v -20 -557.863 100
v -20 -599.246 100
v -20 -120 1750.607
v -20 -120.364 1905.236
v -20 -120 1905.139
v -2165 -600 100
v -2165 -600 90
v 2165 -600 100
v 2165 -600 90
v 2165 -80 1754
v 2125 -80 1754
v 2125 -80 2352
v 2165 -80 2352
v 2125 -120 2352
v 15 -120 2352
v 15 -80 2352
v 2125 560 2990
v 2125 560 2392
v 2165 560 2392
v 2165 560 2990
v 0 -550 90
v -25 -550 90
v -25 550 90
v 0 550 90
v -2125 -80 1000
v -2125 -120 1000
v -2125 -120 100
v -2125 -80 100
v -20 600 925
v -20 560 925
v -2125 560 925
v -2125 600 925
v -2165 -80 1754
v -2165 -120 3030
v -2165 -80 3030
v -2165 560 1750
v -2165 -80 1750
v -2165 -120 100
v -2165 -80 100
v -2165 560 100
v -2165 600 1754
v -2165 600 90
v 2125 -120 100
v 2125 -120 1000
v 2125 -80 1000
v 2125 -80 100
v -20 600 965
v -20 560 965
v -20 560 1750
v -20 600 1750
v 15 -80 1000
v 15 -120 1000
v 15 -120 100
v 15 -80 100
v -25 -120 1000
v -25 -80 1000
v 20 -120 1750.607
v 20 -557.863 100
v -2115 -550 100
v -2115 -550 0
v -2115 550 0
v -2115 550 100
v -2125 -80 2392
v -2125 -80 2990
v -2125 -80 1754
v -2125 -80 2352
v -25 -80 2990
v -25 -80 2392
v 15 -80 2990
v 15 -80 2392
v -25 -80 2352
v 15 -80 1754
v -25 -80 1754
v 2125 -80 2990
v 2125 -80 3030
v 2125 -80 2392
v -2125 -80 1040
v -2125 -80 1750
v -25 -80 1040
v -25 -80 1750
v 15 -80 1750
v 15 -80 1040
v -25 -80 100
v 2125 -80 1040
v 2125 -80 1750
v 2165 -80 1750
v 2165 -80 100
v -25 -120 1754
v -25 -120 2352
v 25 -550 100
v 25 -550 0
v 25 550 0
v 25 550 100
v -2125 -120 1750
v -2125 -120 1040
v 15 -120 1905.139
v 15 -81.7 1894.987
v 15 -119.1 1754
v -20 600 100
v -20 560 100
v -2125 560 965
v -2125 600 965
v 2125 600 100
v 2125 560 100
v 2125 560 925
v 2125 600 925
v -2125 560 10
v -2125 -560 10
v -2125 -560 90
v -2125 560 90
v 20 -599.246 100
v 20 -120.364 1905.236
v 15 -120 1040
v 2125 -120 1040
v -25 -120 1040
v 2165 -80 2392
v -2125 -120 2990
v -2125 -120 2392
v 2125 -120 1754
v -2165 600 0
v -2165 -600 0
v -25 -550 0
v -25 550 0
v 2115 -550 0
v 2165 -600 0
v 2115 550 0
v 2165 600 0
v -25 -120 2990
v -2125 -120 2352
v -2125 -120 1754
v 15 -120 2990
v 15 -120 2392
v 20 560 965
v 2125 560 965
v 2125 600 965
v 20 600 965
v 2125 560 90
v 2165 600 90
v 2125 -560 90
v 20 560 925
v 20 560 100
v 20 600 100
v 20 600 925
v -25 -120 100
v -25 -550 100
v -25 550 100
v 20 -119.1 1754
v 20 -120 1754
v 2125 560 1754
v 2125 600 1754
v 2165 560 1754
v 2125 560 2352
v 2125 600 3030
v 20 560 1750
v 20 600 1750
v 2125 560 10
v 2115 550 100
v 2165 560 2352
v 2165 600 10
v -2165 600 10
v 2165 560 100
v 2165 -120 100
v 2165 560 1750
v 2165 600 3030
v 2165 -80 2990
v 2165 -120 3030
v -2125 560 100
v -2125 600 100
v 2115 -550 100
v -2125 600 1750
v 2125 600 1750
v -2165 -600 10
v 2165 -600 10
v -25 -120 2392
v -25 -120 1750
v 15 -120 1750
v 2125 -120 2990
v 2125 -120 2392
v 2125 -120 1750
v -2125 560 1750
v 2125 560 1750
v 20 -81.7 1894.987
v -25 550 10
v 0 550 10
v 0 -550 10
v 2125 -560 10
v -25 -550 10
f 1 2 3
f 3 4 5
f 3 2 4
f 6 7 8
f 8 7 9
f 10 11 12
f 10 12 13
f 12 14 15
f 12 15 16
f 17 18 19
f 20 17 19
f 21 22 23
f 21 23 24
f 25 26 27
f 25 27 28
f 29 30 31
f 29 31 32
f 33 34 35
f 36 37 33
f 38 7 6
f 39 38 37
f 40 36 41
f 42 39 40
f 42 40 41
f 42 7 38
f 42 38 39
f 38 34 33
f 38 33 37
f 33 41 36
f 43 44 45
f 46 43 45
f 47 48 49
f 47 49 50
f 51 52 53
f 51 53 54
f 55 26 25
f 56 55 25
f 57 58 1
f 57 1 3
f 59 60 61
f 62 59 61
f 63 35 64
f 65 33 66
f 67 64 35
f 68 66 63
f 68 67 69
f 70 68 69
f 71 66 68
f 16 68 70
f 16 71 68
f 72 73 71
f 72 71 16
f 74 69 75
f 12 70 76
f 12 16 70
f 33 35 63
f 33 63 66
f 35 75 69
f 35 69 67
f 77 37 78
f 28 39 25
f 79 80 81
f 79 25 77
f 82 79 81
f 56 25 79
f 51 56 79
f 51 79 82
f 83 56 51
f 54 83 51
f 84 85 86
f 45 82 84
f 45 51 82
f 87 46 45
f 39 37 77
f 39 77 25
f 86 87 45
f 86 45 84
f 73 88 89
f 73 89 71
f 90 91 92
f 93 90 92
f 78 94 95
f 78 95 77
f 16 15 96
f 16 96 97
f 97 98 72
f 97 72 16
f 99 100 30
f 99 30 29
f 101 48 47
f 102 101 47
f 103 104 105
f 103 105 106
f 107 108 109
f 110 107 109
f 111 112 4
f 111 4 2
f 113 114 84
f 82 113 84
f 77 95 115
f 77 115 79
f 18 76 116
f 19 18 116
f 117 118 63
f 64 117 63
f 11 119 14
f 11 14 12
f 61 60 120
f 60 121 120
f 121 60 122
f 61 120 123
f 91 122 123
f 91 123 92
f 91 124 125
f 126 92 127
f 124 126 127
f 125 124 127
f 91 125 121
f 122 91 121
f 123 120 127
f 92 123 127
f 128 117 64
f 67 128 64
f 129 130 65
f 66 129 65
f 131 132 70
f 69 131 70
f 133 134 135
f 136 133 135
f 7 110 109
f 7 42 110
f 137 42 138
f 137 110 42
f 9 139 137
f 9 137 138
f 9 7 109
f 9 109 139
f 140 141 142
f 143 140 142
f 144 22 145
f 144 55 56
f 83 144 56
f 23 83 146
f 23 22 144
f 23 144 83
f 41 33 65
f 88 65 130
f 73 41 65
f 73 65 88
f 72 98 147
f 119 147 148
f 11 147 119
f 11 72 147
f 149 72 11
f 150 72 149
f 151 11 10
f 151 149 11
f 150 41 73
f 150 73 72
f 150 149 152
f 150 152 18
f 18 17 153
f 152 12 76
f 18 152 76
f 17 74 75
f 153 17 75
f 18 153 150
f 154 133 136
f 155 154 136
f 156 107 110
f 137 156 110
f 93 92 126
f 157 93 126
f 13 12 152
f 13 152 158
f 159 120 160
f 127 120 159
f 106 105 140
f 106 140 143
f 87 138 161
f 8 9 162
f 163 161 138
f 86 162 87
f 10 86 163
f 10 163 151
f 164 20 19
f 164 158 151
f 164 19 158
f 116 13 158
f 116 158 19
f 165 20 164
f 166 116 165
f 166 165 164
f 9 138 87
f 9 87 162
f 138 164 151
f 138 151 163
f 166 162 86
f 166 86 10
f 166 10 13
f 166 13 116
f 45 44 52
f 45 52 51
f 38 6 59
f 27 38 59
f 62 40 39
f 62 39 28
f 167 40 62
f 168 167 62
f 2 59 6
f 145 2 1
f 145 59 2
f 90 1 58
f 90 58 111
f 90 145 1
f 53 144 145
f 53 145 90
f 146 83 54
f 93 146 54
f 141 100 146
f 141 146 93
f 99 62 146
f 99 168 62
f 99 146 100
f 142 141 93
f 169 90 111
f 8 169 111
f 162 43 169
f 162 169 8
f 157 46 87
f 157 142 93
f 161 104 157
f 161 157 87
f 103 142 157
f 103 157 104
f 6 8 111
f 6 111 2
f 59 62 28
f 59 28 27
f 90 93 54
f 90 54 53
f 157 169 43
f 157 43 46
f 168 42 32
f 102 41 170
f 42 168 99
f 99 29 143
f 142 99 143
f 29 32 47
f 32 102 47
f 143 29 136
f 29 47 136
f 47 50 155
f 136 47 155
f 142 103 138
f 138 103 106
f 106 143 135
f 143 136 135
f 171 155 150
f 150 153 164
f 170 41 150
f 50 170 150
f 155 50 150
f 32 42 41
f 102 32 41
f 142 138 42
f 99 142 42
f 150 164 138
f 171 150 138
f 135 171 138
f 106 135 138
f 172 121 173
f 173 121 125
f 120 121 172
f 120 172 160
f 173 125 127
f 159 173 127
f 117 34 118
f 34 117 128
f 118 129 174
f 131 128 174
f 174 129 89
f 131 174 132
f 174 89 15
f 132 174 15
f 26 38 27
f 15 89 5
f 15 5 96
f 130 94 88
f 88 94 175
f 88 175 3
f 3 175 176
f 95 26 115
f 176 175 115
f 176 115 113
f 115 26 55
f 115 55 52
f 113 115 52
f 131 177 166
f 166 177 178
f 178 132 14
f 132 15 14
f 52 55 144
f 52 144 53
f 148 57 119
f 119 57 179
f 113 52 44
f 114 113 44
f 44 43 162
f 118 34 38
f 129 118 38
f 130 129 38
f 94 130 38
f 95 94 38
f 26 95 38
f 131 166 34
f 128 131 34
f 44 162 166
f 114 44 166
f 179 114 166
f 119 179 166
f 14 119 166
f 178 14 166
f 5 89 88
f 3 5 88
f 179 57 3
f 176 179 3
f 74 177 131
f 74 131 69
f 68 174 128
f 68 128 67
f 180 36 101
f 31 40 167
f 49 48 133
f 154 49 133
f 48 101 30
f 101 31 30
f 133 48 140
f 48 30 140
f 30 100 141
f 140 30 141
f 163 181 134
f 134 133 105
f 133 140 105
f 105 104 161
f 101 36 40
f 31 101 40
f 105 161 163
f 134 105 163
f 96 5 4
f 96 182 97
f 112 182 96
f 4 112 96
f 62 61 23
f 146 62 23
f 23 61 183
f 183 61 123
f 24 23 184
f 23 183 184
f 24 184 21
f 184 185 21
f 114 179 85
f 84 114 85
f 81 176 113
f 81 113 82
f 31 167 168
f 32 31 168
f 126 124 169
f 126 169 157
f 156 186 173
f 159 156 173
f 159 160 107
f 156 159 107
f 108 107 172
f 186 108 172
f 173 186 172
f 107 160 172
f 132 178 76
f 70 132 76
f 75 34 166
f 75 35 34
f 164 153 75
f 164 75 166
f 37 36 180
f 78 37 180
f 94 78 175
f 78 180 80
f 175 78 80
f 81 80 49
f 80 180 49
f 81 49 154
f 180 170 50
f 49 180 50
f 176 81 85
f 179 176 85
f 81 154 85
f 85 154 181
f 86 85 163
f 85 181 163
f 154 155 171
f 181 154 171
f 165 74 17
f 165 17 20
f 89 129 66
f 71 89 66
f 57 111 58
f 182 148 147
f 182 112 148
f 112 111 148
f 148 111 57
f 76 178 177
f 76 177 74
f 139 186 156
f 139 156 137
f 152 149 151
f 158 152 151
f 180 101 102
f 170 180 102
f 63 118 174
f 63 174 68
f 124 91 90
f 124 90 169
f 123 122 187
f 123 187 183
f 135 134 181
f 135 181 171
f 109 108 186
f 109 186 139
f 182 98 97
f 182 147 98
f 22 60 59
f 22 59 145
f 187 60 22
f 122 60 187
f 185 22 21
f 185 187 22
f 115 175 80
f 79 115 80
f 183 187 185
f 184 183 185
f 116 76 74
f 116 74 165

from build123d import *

# Parameters (mm, degrees)
F0_W          = 4330
F0_H          = 1200
F0_W_2        = 2090
F0_H_2        = 1100
F1_DEPTH      = 100
F2_W          = 40
F2_H          = 80
F3_DEPTH      = 4330.001
F4_W          = 40
F4_H          = 80
F5_DEPTH      = 1160.001
F7_W          = 90
F7_H          = 80
F8_DEPTH      = 550
F8_DEPTH_BACK = 550
F9_W          = 40
F9_H          = 40
F10_DEPTH     = 2930
F11_W         = 4330
F11_H         = 720
F12_DEPTH     = 4
F13_DEPTH     = 1650
F14_W         = 40
F14_H         = 40
F15_DEPTH     = 4300
F16_W         = 40
F16_H         = 40
F17_DEPTH     = 720
F19_DEPTH     = 20


with BuildPart() as f1:
    # F0 (on Top) → F1 (new body)
    with BuildSketch(Plane.XY):
        Rectangle(F0_W, F0_H)
        with Locations((-1070, 0)):
            Rectangle(F0_W_2, F0_H_2, mode=Mode.SUBTRACT)
        with Locations((1070, 0)):
            Rectangle(F0_W_2, F0_H_2, mode=Mode.SUBTRACT)
    extrude(amount=F1_DEPTH)

    # F2 (on face) → F3 (cut, through all)
    with BuildSketch(Plane(origin=(-2165, 0, 0), x_dir=(0, -1, 0), z_dir=(-1, 0, 0))):
        with Locations((-580, 50)):
            Rectangle(F2_W, F2_H)
        with Locations((580, 50)):
            Rectangle(F2_W, F2_H)
    extrude(amount=-F3_DEPTH, mode=Mode.SUBTRACT)

    # F4 (on face) → F5 (cut, through all)
    with BuildSketch(Plane.XZ.offset(560)):
        with Locations((2145, 50)):
            Rectangle(F4_W, F4_H)
        with Locations((-2145, 50)):
            Rectangle(F4_W, F4_H)
    extrude(amount=-F5_DEPTH, mode=Mode.SUBTRACT)

    # F7 (on Front) → F8 (cut, two sides)
    with BuildSketch(Plane.XZ) as f8_sk:
        with Locations((-45, 50)):
            Rectangle(F7_W, F7_H)
    extrude(amount=-F8_DEPTH, mode=Mode.SUBTRACT)
    extrude(f8_sk.sketch, amount=F8_DEPTH_BACK, mode=Mode.SUBTRACT)

    # F9 (on face) → F10 (join)
    with BuildSketch(Plane.XY.offset(100)):
        with Locations((-2145, -100)):
            Rectangle(F9_W, F9_H)
        with Locations((-5, -100)):
            Rectangle(F9_W, F9_H)
        with Locations((2145, 580)):
            Rectangle(F9_W, F9_H)
        with Locations((2145, -100)):
            Rectangle(F9_W, F9_H)
    extrude(amount=F10_DEPTH)

    # F11 (on offset) → F12 (join)
    with BuildSketch(Plane.XY.offset(1750)):
        with Locations((0, 240)):
            Rectangle(F11_W, F11_H)
    extrude(amount=F12_DEPTH)

    # F9 (on face) → F13 (join)
    with BuildSketch(Plane.XY.offset(100)):
        with Locations((-2145, 580)):
            Rectangle(F9_W, F9_H)
        with Locations((2145, 580)):
            Rectangle(F9_W, F9_H)
        with Locations((0, 580)):
            Rectangle(F9_W, F9_H)
        with Locations((-2145, -100)):
            Rectangle(F9_W, F9_H)
        with Locations((-5, -100)):
            Rectangle(F9_W, F9_H)
        with Locations((2145, -100)):
            Rectangle(F9_W, F9_H)
    extrude(amount=F13_DEPTH)

    # F14 (on face) → F15 (join)
    with BuildSketch(Plane.YZ.offset(2165)):
        with Locations((-100, 3010)):
            Rectangle(F14_W, F14_H)
        with Locations((580, 945)):
            Rectangle(F14_W, F14_H)
        with Locations((-100, 1020)):
            Rectangle(F14_W, F14_H)
        with Locations((-100, 2372)):
            Rectangle(F14_W, F14_H)
    extrude(amount=-F15_DEPTH)

    # F16 (on face) → F17 (join)
    with BuildSketch(Plane.XZ.offset(120)):
        with Locations((2145, 2372)):
            Rectangle(F16_W, F16_H)
        with Locations((2145, 3010)):
            Rectangle(F16_W, F16_H)
    extrude(amount=-F17_DEPTH)

    # F18 (on Right) → F19 (join, symmetric)
    with BuildSketch(Plane.YZ):
        Polygon((-81.6997326648, 1894.9868524751), (-120.3644446259, 1905.2357600368), (-599.6056199074, 98.6450761557), (-558.3395584145, 98.2024500072), align=None)
    extrude(amount=F19_DEPTH, both=True)


solid = f1.part
